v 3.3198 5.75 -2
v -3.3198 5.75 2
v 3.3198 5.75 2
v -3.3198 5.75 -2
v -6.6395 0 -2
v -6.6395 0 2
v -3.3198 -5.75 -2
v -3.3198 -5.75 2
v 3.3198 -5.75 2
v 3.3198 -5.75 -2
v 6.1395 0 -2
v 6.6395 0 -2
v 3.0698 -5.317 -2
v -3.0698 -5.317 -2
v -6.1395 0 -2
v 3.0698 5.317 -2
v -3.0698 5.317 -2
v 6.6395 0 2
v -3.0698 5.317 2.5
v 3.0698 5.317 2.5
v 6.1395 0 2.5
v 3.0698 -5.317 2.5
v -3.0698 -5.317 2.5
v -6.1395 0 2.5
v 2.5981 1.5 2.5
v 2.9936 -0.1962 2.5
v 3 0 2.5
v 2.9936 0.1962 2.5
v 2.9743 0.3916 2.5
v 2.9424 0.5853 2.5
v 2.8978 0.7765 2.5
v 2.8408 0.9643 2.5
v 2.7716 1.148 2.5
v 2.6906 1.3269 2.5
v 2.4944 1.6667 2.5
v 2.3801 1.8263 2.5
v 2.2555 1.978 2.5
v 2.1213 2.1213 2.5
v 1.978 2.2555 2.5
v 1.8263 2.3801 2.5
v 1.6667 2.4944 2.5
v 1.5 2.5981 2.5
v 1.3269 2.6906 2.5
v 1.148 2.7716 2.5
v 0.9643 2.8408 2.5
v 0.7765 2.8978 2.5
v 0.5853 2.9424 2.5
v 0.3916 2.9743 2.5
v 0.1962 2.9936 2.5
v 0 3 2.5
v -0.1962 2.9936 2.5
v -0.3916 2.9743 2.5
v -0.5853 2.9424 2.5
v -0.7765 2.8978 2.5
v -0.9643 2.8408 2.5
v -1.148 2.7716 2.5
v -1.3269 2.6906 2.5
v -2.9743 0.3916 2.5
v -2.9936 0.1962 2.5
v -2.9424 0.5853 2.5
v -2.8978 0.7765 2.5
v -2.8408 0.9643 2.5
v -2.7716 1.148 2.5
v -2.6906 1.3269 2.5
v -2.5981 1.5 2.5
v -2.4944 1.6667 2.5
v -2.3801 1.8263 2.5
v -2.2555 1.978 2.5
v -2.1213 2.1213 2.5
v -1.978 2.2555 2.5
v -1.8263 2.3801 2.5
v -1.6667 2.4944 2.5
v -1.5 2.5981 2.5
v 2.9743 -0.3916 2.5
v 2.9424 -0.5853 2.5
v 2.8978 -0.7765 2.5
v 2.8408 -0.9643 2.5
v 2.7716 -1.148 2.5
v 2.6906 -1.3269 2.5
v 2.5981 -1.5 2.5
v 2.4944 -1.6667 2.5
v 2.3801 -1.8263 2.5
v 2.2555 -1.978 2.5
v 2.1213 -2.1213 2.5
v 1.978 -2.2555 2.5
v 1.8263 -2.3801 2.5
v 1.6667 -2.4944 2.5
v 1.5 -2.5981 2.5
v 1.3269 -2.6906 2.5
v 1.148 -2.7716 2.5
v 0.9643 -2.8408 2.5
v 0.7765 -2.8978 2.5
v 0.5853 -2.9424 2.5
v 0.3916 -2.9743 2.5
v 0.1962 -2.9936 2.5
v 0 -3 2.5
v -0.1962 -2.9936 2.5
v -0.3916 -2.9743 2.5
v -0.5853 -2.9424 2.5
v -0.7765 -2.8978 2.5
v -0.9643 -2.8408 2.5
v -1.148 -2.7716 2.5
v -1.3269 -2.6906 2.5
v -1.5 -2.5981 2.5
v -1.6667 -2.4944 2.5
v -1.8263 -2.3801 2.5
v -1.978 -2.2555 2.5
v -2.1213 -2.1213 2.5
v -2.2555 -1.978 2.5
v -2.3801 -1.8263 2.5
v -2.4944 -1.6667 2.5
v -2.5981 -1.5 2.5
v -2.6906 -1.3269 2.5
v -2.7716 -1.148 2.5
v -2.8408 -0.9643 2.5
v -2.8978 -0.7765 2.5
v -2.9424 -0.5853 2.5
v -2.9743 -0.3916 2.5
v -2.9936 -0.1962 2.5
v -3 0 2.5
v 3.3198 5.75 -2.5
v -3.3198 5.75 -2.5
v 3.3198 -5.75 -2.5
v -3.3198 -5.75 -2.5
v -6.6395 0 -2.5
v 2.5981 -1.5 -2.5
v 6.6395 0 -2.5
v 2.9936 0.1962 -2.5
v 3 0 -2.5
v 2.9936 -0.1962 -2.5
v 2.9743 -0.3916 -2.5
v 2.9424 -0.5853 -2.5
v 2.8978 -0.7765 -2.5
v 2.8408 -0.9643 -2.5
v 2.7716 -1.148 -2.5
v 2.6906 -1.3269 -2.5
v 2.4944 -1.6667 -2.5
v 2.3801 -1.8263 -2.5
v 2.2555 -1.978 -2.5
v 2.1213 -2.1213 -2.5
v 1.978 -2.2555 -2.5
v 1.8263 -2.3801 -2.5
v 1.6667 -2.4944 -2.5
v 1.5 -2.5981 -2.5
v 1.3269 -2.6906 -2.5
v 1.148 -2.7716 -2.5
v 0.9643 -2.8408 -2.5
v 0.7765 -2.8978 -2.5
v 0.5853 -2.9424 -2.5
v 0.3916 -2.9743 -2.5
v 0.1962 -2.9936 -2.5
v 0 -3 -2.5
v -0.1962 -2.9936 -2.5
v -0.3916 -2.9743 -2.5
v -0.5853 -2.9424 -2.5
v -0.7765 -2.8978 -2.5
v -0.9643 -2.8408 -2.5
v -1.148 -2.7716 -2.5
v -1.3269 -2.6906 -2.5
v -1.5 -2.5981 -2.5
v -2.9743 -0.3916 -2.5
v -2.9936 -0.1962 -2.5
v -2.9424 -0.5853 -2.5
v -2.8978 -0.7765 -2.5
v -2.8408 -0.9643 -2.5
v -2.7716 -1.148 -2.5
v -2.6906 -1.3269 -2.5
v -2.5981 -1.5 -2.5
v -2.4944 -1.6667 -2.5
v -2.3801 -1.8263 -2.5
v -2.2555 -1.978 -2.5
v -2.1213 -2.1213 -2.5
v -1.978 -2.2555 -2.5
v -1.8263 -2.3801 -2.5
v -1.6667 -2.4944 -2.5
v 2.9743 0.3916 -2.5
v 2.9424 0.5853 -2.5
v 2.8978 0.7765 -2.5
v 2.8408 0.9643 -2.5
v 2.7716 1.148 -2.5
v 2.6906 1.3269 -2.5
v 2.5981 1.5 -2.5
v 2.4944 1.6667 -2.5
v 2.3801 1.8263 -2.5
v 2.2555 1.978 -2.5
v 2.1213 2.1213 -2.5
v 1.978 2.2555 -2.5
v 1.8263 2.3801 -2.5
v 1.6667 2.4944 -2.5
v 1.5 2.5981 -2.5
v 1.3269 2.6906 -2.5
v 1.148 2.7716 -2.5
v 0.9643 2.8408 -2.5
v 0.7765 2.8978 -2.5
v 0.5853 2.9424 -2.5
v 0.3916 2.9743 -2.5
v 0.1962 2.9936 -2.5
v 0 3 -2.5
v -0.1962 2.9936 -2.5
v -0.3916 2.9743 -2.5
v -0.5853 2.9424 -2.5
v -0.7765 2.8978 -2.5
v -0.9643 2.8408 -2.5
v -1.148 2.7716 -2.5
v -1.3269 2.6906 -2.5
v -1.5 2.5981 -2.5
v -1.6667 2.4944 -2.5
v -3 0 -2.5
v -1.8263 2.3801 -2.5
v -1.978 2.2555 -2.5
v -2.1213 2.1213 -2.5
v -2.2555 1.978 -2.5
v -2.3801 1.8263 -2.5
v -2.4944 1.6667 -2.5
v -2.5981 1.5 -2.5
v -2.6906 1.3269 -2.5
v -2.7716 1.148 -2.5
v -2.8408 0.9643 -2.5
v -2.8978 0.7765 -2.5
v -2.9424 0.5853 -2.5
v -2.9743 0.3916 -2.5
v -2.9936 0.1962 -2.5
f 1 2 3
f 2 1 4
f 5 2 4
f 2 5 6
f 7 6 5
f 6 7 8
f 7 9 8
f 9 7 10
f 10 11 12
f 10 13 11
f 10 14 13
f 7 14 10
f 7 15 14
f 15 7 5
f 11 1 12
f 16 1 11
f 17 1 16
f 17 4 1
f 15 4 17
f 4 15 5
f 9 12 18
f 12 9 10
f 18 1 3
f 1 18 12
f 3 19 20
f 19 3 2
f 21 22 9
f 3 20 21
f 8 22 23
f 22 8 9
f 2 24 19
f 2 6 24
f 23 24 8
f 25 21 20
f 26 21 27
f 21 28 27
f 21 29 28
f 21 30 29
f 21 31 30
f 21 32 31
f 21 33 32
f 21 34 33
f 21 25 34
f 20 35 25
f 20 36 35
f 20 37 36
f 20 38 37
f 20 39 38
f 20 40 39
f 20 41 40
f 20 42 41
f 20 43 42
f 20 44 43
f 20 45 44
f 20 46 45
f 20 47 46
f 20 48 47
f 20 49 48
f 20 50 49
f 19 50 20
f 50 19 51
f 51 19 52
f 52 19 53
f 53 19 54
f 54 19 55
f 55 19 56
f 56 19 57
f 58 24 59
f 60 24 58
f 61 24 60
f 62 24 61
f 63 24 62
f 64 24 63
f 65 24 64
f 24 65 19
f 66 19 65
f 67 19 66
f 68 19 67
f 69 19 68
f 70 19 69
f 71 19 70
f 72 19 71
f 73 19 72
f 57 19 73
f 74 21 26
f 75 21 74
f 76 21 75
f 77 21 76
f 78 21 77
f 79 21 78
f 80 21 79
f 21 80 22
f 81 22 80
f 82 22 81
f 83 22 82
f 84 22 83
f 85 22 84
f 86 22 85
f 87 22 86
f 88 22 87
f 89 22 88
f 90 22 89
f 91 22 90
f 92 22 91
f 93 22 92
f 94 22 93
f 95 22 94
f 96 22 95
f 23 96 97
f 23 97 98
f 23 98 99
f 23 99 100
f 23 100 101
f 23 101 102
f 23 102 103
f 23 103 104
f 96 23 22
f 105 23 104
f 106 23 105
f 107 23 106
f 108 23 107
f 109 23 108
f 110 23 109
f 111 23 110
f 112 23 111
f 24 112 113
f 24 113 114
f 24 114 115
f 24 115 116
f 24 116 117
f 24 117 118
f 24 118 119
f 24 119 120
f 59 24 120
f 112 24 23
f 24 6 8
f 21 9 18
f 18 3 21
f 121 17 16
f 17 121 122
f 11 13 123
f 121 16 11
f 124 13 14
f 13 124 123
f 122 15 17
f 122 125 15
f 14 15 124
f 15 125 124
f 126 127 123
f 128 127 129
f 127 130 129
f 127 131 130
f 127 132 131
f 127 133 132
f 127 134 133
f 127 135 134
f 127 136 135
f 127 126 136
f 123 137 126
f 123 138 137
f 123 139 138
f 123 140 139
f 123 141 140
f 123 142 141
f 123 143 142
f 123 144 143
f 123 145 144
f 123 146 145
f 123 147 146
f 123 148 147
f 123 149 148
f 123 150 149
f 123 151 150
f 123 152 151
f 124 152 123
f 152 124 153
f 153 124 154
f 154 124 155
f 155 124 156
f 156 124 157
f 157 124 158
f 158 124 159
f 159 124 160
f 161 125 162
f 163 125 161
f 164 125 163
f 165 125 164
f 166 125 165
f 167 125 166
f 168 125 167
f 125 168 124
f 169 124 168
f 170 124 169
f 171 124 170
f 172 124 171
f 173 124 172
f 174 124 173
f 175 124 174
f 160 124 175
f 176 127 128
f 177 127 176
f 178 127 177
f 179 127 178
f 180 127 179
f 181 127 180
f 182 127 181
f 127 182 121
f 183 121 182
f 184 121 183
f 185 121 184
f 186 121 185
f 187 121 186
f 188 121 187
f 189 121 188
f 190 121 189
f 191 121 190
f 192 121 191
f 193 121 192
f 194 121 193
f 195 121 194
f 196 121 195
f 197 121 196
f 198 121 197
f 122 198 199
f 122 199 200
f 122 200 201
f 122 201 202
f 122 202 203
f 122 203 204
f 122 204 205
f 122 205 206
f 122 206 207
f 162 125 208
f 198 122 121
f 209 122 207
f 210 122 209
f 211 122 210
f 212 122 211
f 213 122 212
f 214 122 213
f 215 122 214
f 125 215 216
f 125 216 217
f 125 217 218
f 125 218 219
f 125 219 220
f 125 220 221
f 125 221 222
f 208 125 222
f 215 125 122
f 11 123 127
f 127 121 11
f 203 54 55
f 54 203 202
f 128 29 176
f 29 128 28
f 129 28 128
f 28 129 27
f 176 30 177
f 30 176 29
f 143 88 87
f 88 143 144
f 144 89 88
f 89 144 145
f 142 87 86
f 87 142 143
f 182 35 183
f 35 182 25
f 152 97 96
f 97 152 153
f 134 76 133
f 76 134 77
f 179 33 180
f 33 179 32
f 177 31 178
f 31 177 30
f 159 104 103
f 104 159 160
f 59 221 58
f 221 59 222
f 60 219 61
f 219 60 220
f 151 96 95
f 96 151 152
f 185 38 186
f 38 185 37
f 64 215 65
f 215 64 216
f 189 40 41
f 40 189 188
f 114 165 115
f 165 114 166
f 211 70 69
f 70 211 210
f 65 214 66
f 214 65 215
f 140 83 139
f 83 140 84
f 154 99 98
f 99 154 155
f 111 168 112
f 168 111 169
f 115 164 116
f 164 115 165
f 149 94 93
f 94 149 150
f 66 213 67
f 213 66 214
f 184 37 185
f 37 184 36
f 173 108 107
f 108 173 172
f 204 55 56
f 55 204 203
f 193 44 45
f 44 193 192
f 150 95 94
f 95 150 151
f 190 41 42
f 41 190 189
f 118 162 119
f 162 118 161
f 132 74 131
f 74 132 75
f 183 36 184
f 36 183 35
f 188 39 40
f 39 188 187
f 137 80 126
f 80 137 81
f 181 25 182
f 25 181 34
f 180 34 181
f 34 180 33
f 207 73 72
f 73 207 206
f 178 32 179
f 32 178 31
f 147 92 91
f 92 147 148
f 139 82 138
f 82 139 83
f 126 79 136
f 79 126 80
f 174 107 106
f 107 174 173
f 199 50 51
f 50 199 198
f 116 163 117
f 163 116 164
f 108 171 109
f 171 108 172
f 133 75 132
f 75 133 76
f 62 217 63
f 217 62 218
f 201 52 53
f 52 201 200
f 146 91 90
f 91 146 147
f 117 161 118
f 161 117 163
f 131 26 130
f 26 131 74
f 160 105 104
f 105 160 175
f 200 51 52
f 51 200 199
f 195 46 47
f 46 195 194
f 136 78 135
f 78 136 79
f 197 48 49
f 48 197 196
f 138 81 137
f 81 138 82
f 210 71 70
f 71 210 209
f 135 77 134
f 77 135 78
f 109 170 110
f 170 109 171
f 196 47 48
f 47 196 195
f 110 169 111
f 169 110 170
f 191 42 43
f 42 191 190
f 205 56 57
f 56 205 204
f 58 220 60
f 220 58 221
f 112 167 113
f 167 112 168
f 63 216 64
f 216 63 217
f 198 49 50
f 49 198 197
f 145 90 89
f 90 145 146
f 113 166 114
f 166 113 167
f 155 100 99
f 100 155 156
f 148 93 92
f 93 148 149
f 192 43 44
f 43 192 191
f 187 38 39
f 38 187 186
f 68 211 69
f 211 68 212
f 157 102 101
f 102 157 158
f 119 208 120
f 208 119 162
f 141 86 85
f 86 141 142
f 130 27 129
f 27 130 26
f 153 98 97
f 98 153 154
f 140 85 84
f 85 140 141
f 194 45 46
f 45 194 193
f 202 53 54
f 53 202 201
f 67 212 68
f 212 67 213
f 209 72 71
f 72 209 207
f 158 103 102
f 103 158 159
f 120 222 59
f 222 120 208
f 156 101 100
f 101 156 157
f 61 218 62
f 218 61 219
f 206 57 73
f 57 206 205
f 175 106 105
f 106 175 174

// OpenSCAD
// Hex nut: 6.0mm through-hole, 11.5mm across flats, 5.0mm thick
$fn = 96;

// Target dimensions
across_flats = 11.5;
thickness    = 5.0;
hole_diameter = 6.0;

// Edge treatment (simple chamfer)
chamfer_height = 0.5;   // along Z
chamfer_inset  = 0.5;   // radial inset at chamfer
eps = 0.02;             // small overlap to avoid coplanar artifacts

// Derived radii
// For a regular hex: across_flats = 2 * apothem, and apothem = R * cos(30)
R_outer = (across_flats/2) / cos(30);                 // circumradius (vertex radius)
R_chamf = max(0, R_outer - chamfer_inset);            // chamfered circumradius

module hex2d(R) {
    polygon(points=[
        [ R, 0],
        [ R*0.5,  R*sqrt(3)/2],
        [-R*0.5,  R*sqrt(3)/2],
        [-R, 0],
        [-R*0.5, -R*sqrt(3)/2],
        [ R*0.5, -R*sqrt(3)/2]
    ]);
}

module nut_solid() {
    difference() {
        // Outer body with top/bottom chamfers (single connected solid)
        union() {
            // Middle prism
            linear_extrude(height = thickness - 2*chamfer_height, center = true)
                hex2d(R_outer);

            // Top chamfer frustum
            translate([0,0, (thickness/2 - chamfer_height/2)])
                linear_extrude(height = chamfer_height, center = true, scale = R_chamf/R_outer)
                    hex2d(R_outer);

            // Bottom chamfer frustum
            translate([0,0, -(thickness/2 - chamfer_height/2)])
                linear_extrude(height = chamfer_height, center = true, scale = R_chamf/R_outer)
                    hex2d(R_outer);
        }

        // Through-hole (ensure it fully cuts through with overlap)
        cylinder(d = hole_diameter, h = thickness + 2*eps, center = true);
    }
}

color("DimGray") nut_solid();
